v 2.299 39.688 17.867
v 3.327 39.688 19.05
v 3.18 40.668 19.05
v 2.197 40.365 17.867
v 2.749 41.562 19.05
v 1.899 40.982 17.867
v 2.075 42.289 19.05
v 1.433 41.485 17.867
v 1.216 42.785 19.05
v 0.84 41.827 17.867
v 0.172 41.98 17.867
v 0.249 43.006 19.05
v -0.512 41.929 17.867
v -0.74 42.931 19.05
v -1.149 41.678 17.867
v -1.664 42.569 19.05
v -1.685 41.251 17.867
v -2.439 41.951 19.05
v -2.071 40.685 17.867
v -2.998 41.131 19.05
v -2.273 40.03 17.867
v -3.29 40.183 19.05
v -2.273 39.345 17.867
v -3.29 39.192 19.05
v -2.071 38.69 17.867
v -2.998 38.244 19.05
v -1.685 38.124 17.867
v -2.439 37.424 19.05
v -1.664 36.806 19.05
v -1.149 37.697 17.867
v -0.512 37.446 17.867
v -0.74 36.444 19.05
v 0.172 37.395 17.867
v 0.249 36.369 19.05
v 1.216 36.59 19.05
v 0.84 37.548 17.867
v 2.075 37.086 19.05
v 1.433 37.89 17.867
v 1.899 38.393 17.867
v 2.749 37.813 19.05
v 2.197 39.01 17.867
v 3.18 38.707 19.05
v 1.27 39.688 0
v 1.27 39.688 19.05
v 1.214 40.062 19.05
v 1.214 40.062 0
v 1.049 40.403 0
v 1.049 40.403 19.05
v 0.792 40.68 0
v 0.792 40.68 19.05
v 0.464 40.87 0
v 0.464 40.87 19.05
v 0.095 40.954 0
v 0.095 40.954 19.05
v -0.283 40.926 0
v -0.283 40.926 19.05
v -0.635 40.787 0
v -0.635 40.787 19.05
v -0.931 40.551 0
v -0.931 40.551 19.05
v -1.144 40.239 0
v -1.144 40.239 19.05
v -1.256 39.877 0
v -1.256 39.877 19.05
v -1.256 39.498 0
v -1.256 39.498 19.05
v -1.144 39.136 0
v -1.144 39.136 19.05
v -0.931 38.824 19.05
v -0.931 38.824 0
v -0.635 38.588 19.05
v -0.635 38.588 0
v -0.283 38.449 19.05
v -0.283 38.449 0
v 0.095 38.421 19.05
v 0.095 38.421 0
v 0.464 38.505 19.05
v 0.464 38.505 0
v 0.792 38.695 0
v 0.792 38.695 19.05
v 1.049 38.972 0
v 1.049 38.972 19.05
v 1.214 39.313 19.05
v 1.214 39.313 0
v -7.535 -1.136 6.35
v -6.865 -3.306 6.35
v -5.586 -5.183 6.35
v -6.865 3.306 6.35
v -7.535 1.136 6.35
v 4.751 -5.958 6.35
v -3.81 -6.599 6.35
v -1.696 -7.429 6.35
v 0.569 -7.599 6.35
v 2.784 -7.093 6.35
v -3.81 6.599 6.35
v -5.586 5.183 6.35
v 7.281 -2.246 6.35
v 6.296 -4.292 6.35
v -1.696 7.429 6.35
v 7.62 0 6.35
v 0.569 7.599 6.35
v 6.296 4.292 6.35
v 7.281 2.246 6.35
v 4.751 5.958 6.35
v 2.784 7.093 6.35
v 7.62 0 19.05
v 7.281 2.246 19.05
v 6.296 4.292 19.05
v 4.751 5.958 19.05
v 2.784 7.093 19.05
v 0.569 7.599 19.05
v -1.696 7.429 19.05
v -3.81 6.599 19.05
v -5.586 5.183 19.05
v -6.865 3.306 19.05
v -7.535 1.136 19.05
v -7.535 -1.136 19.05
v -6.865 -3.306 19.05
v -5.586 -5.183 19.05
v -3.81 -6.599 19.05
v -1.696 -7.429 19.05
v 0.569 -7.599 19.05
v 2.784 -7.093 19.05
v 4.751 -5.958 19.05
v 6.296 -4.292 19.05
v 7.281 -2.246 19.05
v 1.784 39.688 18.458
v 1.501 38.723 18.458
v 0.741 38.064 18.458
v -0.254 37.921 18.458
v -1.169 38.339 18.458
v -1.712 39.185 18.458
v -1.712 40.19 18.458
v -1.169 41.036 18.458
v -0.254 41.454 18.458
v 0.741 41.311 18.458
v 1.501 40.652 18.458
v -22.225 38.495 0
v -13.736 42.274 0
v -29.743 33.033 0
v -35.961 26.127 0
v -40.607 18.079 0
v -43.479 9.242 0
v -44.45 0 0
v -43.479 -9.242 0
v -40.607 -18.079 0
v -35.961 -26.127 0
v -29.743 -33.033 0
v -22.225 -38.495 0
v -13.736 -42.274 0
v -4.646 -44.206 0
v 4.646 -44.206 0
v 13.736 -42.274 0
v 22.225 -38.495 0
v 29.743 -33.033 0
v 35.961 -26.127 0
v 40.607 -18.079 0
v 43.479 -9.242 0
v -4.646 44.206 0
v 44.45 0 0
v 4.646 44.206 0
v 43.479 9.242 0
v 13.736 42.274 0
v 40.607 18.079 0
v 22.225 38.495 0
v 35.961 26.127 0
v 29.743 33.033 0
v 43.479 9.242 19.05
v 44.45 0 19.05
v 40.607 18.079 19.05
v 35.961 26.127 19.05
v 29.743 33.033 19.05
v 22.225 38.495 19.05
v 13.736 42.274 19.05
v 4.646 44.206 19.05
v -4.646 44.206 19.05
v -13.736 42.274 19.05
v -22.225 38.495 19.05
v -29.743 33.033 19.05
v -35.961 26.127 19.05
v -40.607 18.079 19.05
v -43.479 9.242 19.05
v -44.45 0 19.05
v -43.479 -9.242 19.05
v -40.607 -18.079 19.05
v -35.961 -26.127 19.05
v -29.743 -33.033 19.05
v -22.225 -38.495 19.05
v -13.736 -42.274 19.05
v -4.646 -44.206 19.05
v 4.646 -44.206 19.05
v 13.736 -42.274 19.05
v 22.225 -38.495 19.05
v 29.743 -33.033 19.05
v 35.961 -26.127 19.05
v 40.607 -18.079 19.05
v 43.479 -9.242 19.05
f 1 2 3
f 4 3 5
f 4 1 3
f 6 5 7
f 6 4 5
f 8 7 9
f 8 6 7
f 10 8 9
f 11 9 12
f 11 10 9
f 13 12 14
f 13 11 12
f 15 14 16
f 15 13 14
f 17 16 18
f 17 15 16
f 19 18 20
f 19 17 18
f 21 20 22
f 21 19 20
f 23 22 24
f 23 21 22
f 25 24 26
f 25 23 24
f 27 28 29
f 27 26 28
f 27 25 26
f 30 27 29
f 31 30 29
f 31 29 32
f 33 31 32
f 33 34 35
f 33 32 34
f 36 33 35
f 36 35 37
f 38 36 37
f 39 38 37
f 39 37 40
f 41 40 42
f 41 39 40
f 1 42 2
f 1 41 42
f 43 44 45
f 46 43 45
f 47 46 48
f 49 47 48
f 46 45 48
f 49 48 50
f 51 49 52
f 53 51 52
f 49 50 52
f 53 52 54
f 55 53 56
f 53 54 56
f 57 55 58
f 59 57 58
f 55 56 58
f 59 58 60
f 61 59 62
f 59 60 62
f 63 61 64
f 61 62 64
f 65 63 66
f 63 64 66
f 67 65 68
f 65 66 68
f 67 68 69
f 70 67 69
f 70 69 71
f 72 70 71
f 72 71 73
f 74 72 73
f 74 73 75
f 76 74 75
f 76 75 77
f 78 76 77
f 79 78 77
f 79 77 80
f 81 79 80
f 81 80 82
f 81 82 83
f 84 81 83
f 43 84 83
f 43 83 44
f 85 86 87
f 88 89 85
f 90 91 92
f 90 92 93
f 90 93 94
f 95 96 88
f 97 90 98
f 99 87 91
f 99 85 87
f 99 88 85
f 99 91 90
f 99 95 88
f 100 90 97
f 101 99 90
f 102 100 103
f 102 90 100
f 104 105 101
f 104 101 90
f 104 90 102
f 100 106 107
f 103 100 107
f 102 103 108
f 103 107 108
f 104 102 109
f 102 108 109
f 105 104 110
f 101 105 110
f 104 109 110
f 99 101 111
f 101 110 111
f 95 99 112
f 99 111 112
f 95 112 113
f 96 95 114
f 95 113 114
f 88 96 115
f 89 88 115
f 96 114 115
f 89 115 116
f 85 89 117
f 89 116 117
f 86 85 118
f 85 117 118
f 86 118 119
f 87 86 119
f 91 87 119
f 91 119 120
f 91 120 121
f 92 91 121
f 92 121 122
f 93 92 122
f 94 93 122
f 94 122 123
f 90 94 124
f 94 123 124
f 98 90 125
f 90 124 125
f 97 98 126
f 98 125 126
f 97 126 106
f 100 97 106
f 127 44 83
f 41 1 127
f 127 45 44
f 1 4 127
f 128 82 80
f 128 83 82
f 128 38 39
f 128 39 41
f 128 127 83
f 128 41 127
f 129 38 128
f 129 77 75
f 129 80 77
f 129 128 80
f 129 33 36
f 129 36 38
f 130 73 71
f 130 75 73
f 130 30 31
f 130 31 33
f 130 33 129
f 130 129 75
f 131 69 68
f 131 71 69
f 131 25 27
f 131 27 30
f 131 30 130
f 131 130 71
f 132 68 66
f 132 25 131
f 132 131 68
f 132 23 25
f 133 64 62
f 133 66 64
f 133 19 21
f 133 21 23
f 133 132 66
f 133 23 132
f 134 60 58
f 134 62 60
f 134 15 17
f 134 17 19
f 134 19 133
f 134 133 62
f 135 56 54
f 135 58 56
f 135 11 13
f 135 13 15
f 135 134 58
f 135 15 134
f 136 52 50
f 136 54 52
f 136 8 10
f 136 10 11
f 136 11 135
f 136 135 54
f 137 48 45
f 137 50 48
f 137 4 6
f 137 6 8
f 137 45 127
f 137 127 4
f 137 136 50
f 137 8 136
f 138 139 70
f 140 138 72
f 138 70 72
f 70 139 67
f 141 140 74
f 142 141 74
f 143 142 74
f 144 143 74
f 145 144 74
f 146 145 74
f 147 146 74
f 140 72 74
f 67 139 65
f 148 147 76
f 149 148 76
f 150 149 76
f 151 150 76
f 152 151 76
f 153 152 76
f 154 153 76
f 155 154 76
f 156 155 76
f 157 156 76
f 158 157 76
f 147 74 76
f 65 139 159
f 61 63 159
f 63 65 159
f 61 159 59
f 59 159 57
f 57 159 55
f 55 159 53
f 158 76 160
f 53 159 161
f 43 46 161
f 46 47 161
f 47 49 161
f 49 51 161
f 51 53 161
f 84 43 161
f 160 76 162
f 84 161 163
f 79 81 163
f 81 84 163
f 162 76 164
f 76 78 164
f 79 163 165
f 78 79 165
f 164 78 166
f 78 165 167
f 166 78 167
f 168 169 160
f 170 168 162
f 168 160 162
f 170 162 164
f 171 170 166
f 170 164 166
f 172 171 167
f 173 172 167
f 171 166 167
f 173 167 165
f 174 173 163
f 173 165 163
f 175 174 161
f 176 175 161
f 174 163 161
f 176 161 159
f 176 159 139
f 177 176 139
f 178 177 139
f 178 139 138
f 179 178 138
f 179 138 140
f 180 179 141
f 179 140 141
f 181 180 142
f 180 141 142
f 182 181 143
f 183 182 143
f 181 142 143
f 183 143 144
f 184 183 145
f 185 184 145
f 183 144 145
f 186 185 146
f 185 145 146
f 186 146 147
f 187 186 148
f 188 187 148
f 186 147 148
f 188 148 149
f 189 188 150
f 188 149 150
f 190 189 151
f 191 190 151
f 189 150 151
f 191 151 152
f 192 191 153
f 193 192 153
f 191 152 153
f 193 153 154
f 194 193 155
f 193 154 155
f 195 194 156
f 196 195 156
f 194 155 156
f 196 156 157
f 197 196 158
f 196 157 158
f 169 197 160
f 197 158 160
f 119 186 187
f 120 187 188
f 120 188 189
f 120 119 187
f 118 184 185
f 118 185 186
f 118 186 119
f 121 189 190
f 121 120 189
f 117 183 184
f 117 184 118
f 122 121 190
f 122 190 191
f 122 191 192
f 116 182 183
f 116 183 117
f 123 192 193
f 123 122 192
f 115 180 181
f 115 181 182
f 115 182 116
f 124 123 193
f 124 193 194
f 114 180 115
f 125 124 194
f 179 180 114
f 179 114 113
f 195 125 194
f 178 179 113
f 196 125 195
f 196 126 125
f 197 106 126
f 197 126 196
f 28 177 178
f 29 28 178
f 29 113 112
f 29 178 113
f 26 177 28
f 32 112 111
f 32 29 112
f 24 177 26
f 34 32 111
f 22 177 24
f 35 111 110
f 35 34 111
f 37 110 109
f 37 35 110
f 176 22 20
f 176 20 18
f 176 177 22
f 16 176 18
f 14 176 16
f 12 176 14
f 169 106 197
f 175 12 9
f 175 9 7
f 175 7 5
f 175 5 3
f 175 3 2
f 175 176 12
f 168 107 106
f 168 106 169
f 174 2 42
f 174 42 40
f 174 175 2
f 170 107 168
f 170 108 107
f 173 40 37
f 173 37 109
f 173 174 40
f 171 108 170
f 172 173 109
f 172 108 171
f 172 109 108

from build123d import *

# Parameters (mm, degrees)
F0_R     = 44.45
F1_DEPTH = 19.05
F2_R     = 7.62
F3_DEPTH = 12.7
F4_R     = 1.27
F5_DEPTH = 19.051
F6_R     = 3.3274
F6_R_2   = 1.27
F7_DEPTH = 2.1082
F7_TAPER = 41


with BuildPart() as f1:
    # F0 (on Top) → F1 (new body)
    with BuildSketch(Plane.XY):
        Circle(F0_R)
    extrude(amount=F1_DEPTH)

    # F2 (on face) → F3 (cut)
    with BuildSketch(Plane.XY.offset(19.05)):
        Circle(F2_R)
    extrude(amount=-F3_DEPTH, mode=Mode.SUBTRACT)

    # F4 (on face) → F5 (cut, through all)
    with BuildSketch(Plane.XY.offset(19.05)):
        with Locations((0, 39.6875)):
            Circle(F4_R)
    extrude(amount=-F5_DEPTH, mode=Mode.SUBTRACT)

    # F6 (on face) → F7 (cut)
    with BuildSketch(Plane.XY.offset(19.05)):
        with Locations((0, 39.6875)):
            Circle(F6_R)
        with Locations((0, 39.6875)):
            Circle(F6_R_2, mode=Mode.SUBTRACT)
    extrude(amount=-F7_DEPTH, taper=F7_TAPER, mode=Mode.SUBTRACT)


solid = f1.part
